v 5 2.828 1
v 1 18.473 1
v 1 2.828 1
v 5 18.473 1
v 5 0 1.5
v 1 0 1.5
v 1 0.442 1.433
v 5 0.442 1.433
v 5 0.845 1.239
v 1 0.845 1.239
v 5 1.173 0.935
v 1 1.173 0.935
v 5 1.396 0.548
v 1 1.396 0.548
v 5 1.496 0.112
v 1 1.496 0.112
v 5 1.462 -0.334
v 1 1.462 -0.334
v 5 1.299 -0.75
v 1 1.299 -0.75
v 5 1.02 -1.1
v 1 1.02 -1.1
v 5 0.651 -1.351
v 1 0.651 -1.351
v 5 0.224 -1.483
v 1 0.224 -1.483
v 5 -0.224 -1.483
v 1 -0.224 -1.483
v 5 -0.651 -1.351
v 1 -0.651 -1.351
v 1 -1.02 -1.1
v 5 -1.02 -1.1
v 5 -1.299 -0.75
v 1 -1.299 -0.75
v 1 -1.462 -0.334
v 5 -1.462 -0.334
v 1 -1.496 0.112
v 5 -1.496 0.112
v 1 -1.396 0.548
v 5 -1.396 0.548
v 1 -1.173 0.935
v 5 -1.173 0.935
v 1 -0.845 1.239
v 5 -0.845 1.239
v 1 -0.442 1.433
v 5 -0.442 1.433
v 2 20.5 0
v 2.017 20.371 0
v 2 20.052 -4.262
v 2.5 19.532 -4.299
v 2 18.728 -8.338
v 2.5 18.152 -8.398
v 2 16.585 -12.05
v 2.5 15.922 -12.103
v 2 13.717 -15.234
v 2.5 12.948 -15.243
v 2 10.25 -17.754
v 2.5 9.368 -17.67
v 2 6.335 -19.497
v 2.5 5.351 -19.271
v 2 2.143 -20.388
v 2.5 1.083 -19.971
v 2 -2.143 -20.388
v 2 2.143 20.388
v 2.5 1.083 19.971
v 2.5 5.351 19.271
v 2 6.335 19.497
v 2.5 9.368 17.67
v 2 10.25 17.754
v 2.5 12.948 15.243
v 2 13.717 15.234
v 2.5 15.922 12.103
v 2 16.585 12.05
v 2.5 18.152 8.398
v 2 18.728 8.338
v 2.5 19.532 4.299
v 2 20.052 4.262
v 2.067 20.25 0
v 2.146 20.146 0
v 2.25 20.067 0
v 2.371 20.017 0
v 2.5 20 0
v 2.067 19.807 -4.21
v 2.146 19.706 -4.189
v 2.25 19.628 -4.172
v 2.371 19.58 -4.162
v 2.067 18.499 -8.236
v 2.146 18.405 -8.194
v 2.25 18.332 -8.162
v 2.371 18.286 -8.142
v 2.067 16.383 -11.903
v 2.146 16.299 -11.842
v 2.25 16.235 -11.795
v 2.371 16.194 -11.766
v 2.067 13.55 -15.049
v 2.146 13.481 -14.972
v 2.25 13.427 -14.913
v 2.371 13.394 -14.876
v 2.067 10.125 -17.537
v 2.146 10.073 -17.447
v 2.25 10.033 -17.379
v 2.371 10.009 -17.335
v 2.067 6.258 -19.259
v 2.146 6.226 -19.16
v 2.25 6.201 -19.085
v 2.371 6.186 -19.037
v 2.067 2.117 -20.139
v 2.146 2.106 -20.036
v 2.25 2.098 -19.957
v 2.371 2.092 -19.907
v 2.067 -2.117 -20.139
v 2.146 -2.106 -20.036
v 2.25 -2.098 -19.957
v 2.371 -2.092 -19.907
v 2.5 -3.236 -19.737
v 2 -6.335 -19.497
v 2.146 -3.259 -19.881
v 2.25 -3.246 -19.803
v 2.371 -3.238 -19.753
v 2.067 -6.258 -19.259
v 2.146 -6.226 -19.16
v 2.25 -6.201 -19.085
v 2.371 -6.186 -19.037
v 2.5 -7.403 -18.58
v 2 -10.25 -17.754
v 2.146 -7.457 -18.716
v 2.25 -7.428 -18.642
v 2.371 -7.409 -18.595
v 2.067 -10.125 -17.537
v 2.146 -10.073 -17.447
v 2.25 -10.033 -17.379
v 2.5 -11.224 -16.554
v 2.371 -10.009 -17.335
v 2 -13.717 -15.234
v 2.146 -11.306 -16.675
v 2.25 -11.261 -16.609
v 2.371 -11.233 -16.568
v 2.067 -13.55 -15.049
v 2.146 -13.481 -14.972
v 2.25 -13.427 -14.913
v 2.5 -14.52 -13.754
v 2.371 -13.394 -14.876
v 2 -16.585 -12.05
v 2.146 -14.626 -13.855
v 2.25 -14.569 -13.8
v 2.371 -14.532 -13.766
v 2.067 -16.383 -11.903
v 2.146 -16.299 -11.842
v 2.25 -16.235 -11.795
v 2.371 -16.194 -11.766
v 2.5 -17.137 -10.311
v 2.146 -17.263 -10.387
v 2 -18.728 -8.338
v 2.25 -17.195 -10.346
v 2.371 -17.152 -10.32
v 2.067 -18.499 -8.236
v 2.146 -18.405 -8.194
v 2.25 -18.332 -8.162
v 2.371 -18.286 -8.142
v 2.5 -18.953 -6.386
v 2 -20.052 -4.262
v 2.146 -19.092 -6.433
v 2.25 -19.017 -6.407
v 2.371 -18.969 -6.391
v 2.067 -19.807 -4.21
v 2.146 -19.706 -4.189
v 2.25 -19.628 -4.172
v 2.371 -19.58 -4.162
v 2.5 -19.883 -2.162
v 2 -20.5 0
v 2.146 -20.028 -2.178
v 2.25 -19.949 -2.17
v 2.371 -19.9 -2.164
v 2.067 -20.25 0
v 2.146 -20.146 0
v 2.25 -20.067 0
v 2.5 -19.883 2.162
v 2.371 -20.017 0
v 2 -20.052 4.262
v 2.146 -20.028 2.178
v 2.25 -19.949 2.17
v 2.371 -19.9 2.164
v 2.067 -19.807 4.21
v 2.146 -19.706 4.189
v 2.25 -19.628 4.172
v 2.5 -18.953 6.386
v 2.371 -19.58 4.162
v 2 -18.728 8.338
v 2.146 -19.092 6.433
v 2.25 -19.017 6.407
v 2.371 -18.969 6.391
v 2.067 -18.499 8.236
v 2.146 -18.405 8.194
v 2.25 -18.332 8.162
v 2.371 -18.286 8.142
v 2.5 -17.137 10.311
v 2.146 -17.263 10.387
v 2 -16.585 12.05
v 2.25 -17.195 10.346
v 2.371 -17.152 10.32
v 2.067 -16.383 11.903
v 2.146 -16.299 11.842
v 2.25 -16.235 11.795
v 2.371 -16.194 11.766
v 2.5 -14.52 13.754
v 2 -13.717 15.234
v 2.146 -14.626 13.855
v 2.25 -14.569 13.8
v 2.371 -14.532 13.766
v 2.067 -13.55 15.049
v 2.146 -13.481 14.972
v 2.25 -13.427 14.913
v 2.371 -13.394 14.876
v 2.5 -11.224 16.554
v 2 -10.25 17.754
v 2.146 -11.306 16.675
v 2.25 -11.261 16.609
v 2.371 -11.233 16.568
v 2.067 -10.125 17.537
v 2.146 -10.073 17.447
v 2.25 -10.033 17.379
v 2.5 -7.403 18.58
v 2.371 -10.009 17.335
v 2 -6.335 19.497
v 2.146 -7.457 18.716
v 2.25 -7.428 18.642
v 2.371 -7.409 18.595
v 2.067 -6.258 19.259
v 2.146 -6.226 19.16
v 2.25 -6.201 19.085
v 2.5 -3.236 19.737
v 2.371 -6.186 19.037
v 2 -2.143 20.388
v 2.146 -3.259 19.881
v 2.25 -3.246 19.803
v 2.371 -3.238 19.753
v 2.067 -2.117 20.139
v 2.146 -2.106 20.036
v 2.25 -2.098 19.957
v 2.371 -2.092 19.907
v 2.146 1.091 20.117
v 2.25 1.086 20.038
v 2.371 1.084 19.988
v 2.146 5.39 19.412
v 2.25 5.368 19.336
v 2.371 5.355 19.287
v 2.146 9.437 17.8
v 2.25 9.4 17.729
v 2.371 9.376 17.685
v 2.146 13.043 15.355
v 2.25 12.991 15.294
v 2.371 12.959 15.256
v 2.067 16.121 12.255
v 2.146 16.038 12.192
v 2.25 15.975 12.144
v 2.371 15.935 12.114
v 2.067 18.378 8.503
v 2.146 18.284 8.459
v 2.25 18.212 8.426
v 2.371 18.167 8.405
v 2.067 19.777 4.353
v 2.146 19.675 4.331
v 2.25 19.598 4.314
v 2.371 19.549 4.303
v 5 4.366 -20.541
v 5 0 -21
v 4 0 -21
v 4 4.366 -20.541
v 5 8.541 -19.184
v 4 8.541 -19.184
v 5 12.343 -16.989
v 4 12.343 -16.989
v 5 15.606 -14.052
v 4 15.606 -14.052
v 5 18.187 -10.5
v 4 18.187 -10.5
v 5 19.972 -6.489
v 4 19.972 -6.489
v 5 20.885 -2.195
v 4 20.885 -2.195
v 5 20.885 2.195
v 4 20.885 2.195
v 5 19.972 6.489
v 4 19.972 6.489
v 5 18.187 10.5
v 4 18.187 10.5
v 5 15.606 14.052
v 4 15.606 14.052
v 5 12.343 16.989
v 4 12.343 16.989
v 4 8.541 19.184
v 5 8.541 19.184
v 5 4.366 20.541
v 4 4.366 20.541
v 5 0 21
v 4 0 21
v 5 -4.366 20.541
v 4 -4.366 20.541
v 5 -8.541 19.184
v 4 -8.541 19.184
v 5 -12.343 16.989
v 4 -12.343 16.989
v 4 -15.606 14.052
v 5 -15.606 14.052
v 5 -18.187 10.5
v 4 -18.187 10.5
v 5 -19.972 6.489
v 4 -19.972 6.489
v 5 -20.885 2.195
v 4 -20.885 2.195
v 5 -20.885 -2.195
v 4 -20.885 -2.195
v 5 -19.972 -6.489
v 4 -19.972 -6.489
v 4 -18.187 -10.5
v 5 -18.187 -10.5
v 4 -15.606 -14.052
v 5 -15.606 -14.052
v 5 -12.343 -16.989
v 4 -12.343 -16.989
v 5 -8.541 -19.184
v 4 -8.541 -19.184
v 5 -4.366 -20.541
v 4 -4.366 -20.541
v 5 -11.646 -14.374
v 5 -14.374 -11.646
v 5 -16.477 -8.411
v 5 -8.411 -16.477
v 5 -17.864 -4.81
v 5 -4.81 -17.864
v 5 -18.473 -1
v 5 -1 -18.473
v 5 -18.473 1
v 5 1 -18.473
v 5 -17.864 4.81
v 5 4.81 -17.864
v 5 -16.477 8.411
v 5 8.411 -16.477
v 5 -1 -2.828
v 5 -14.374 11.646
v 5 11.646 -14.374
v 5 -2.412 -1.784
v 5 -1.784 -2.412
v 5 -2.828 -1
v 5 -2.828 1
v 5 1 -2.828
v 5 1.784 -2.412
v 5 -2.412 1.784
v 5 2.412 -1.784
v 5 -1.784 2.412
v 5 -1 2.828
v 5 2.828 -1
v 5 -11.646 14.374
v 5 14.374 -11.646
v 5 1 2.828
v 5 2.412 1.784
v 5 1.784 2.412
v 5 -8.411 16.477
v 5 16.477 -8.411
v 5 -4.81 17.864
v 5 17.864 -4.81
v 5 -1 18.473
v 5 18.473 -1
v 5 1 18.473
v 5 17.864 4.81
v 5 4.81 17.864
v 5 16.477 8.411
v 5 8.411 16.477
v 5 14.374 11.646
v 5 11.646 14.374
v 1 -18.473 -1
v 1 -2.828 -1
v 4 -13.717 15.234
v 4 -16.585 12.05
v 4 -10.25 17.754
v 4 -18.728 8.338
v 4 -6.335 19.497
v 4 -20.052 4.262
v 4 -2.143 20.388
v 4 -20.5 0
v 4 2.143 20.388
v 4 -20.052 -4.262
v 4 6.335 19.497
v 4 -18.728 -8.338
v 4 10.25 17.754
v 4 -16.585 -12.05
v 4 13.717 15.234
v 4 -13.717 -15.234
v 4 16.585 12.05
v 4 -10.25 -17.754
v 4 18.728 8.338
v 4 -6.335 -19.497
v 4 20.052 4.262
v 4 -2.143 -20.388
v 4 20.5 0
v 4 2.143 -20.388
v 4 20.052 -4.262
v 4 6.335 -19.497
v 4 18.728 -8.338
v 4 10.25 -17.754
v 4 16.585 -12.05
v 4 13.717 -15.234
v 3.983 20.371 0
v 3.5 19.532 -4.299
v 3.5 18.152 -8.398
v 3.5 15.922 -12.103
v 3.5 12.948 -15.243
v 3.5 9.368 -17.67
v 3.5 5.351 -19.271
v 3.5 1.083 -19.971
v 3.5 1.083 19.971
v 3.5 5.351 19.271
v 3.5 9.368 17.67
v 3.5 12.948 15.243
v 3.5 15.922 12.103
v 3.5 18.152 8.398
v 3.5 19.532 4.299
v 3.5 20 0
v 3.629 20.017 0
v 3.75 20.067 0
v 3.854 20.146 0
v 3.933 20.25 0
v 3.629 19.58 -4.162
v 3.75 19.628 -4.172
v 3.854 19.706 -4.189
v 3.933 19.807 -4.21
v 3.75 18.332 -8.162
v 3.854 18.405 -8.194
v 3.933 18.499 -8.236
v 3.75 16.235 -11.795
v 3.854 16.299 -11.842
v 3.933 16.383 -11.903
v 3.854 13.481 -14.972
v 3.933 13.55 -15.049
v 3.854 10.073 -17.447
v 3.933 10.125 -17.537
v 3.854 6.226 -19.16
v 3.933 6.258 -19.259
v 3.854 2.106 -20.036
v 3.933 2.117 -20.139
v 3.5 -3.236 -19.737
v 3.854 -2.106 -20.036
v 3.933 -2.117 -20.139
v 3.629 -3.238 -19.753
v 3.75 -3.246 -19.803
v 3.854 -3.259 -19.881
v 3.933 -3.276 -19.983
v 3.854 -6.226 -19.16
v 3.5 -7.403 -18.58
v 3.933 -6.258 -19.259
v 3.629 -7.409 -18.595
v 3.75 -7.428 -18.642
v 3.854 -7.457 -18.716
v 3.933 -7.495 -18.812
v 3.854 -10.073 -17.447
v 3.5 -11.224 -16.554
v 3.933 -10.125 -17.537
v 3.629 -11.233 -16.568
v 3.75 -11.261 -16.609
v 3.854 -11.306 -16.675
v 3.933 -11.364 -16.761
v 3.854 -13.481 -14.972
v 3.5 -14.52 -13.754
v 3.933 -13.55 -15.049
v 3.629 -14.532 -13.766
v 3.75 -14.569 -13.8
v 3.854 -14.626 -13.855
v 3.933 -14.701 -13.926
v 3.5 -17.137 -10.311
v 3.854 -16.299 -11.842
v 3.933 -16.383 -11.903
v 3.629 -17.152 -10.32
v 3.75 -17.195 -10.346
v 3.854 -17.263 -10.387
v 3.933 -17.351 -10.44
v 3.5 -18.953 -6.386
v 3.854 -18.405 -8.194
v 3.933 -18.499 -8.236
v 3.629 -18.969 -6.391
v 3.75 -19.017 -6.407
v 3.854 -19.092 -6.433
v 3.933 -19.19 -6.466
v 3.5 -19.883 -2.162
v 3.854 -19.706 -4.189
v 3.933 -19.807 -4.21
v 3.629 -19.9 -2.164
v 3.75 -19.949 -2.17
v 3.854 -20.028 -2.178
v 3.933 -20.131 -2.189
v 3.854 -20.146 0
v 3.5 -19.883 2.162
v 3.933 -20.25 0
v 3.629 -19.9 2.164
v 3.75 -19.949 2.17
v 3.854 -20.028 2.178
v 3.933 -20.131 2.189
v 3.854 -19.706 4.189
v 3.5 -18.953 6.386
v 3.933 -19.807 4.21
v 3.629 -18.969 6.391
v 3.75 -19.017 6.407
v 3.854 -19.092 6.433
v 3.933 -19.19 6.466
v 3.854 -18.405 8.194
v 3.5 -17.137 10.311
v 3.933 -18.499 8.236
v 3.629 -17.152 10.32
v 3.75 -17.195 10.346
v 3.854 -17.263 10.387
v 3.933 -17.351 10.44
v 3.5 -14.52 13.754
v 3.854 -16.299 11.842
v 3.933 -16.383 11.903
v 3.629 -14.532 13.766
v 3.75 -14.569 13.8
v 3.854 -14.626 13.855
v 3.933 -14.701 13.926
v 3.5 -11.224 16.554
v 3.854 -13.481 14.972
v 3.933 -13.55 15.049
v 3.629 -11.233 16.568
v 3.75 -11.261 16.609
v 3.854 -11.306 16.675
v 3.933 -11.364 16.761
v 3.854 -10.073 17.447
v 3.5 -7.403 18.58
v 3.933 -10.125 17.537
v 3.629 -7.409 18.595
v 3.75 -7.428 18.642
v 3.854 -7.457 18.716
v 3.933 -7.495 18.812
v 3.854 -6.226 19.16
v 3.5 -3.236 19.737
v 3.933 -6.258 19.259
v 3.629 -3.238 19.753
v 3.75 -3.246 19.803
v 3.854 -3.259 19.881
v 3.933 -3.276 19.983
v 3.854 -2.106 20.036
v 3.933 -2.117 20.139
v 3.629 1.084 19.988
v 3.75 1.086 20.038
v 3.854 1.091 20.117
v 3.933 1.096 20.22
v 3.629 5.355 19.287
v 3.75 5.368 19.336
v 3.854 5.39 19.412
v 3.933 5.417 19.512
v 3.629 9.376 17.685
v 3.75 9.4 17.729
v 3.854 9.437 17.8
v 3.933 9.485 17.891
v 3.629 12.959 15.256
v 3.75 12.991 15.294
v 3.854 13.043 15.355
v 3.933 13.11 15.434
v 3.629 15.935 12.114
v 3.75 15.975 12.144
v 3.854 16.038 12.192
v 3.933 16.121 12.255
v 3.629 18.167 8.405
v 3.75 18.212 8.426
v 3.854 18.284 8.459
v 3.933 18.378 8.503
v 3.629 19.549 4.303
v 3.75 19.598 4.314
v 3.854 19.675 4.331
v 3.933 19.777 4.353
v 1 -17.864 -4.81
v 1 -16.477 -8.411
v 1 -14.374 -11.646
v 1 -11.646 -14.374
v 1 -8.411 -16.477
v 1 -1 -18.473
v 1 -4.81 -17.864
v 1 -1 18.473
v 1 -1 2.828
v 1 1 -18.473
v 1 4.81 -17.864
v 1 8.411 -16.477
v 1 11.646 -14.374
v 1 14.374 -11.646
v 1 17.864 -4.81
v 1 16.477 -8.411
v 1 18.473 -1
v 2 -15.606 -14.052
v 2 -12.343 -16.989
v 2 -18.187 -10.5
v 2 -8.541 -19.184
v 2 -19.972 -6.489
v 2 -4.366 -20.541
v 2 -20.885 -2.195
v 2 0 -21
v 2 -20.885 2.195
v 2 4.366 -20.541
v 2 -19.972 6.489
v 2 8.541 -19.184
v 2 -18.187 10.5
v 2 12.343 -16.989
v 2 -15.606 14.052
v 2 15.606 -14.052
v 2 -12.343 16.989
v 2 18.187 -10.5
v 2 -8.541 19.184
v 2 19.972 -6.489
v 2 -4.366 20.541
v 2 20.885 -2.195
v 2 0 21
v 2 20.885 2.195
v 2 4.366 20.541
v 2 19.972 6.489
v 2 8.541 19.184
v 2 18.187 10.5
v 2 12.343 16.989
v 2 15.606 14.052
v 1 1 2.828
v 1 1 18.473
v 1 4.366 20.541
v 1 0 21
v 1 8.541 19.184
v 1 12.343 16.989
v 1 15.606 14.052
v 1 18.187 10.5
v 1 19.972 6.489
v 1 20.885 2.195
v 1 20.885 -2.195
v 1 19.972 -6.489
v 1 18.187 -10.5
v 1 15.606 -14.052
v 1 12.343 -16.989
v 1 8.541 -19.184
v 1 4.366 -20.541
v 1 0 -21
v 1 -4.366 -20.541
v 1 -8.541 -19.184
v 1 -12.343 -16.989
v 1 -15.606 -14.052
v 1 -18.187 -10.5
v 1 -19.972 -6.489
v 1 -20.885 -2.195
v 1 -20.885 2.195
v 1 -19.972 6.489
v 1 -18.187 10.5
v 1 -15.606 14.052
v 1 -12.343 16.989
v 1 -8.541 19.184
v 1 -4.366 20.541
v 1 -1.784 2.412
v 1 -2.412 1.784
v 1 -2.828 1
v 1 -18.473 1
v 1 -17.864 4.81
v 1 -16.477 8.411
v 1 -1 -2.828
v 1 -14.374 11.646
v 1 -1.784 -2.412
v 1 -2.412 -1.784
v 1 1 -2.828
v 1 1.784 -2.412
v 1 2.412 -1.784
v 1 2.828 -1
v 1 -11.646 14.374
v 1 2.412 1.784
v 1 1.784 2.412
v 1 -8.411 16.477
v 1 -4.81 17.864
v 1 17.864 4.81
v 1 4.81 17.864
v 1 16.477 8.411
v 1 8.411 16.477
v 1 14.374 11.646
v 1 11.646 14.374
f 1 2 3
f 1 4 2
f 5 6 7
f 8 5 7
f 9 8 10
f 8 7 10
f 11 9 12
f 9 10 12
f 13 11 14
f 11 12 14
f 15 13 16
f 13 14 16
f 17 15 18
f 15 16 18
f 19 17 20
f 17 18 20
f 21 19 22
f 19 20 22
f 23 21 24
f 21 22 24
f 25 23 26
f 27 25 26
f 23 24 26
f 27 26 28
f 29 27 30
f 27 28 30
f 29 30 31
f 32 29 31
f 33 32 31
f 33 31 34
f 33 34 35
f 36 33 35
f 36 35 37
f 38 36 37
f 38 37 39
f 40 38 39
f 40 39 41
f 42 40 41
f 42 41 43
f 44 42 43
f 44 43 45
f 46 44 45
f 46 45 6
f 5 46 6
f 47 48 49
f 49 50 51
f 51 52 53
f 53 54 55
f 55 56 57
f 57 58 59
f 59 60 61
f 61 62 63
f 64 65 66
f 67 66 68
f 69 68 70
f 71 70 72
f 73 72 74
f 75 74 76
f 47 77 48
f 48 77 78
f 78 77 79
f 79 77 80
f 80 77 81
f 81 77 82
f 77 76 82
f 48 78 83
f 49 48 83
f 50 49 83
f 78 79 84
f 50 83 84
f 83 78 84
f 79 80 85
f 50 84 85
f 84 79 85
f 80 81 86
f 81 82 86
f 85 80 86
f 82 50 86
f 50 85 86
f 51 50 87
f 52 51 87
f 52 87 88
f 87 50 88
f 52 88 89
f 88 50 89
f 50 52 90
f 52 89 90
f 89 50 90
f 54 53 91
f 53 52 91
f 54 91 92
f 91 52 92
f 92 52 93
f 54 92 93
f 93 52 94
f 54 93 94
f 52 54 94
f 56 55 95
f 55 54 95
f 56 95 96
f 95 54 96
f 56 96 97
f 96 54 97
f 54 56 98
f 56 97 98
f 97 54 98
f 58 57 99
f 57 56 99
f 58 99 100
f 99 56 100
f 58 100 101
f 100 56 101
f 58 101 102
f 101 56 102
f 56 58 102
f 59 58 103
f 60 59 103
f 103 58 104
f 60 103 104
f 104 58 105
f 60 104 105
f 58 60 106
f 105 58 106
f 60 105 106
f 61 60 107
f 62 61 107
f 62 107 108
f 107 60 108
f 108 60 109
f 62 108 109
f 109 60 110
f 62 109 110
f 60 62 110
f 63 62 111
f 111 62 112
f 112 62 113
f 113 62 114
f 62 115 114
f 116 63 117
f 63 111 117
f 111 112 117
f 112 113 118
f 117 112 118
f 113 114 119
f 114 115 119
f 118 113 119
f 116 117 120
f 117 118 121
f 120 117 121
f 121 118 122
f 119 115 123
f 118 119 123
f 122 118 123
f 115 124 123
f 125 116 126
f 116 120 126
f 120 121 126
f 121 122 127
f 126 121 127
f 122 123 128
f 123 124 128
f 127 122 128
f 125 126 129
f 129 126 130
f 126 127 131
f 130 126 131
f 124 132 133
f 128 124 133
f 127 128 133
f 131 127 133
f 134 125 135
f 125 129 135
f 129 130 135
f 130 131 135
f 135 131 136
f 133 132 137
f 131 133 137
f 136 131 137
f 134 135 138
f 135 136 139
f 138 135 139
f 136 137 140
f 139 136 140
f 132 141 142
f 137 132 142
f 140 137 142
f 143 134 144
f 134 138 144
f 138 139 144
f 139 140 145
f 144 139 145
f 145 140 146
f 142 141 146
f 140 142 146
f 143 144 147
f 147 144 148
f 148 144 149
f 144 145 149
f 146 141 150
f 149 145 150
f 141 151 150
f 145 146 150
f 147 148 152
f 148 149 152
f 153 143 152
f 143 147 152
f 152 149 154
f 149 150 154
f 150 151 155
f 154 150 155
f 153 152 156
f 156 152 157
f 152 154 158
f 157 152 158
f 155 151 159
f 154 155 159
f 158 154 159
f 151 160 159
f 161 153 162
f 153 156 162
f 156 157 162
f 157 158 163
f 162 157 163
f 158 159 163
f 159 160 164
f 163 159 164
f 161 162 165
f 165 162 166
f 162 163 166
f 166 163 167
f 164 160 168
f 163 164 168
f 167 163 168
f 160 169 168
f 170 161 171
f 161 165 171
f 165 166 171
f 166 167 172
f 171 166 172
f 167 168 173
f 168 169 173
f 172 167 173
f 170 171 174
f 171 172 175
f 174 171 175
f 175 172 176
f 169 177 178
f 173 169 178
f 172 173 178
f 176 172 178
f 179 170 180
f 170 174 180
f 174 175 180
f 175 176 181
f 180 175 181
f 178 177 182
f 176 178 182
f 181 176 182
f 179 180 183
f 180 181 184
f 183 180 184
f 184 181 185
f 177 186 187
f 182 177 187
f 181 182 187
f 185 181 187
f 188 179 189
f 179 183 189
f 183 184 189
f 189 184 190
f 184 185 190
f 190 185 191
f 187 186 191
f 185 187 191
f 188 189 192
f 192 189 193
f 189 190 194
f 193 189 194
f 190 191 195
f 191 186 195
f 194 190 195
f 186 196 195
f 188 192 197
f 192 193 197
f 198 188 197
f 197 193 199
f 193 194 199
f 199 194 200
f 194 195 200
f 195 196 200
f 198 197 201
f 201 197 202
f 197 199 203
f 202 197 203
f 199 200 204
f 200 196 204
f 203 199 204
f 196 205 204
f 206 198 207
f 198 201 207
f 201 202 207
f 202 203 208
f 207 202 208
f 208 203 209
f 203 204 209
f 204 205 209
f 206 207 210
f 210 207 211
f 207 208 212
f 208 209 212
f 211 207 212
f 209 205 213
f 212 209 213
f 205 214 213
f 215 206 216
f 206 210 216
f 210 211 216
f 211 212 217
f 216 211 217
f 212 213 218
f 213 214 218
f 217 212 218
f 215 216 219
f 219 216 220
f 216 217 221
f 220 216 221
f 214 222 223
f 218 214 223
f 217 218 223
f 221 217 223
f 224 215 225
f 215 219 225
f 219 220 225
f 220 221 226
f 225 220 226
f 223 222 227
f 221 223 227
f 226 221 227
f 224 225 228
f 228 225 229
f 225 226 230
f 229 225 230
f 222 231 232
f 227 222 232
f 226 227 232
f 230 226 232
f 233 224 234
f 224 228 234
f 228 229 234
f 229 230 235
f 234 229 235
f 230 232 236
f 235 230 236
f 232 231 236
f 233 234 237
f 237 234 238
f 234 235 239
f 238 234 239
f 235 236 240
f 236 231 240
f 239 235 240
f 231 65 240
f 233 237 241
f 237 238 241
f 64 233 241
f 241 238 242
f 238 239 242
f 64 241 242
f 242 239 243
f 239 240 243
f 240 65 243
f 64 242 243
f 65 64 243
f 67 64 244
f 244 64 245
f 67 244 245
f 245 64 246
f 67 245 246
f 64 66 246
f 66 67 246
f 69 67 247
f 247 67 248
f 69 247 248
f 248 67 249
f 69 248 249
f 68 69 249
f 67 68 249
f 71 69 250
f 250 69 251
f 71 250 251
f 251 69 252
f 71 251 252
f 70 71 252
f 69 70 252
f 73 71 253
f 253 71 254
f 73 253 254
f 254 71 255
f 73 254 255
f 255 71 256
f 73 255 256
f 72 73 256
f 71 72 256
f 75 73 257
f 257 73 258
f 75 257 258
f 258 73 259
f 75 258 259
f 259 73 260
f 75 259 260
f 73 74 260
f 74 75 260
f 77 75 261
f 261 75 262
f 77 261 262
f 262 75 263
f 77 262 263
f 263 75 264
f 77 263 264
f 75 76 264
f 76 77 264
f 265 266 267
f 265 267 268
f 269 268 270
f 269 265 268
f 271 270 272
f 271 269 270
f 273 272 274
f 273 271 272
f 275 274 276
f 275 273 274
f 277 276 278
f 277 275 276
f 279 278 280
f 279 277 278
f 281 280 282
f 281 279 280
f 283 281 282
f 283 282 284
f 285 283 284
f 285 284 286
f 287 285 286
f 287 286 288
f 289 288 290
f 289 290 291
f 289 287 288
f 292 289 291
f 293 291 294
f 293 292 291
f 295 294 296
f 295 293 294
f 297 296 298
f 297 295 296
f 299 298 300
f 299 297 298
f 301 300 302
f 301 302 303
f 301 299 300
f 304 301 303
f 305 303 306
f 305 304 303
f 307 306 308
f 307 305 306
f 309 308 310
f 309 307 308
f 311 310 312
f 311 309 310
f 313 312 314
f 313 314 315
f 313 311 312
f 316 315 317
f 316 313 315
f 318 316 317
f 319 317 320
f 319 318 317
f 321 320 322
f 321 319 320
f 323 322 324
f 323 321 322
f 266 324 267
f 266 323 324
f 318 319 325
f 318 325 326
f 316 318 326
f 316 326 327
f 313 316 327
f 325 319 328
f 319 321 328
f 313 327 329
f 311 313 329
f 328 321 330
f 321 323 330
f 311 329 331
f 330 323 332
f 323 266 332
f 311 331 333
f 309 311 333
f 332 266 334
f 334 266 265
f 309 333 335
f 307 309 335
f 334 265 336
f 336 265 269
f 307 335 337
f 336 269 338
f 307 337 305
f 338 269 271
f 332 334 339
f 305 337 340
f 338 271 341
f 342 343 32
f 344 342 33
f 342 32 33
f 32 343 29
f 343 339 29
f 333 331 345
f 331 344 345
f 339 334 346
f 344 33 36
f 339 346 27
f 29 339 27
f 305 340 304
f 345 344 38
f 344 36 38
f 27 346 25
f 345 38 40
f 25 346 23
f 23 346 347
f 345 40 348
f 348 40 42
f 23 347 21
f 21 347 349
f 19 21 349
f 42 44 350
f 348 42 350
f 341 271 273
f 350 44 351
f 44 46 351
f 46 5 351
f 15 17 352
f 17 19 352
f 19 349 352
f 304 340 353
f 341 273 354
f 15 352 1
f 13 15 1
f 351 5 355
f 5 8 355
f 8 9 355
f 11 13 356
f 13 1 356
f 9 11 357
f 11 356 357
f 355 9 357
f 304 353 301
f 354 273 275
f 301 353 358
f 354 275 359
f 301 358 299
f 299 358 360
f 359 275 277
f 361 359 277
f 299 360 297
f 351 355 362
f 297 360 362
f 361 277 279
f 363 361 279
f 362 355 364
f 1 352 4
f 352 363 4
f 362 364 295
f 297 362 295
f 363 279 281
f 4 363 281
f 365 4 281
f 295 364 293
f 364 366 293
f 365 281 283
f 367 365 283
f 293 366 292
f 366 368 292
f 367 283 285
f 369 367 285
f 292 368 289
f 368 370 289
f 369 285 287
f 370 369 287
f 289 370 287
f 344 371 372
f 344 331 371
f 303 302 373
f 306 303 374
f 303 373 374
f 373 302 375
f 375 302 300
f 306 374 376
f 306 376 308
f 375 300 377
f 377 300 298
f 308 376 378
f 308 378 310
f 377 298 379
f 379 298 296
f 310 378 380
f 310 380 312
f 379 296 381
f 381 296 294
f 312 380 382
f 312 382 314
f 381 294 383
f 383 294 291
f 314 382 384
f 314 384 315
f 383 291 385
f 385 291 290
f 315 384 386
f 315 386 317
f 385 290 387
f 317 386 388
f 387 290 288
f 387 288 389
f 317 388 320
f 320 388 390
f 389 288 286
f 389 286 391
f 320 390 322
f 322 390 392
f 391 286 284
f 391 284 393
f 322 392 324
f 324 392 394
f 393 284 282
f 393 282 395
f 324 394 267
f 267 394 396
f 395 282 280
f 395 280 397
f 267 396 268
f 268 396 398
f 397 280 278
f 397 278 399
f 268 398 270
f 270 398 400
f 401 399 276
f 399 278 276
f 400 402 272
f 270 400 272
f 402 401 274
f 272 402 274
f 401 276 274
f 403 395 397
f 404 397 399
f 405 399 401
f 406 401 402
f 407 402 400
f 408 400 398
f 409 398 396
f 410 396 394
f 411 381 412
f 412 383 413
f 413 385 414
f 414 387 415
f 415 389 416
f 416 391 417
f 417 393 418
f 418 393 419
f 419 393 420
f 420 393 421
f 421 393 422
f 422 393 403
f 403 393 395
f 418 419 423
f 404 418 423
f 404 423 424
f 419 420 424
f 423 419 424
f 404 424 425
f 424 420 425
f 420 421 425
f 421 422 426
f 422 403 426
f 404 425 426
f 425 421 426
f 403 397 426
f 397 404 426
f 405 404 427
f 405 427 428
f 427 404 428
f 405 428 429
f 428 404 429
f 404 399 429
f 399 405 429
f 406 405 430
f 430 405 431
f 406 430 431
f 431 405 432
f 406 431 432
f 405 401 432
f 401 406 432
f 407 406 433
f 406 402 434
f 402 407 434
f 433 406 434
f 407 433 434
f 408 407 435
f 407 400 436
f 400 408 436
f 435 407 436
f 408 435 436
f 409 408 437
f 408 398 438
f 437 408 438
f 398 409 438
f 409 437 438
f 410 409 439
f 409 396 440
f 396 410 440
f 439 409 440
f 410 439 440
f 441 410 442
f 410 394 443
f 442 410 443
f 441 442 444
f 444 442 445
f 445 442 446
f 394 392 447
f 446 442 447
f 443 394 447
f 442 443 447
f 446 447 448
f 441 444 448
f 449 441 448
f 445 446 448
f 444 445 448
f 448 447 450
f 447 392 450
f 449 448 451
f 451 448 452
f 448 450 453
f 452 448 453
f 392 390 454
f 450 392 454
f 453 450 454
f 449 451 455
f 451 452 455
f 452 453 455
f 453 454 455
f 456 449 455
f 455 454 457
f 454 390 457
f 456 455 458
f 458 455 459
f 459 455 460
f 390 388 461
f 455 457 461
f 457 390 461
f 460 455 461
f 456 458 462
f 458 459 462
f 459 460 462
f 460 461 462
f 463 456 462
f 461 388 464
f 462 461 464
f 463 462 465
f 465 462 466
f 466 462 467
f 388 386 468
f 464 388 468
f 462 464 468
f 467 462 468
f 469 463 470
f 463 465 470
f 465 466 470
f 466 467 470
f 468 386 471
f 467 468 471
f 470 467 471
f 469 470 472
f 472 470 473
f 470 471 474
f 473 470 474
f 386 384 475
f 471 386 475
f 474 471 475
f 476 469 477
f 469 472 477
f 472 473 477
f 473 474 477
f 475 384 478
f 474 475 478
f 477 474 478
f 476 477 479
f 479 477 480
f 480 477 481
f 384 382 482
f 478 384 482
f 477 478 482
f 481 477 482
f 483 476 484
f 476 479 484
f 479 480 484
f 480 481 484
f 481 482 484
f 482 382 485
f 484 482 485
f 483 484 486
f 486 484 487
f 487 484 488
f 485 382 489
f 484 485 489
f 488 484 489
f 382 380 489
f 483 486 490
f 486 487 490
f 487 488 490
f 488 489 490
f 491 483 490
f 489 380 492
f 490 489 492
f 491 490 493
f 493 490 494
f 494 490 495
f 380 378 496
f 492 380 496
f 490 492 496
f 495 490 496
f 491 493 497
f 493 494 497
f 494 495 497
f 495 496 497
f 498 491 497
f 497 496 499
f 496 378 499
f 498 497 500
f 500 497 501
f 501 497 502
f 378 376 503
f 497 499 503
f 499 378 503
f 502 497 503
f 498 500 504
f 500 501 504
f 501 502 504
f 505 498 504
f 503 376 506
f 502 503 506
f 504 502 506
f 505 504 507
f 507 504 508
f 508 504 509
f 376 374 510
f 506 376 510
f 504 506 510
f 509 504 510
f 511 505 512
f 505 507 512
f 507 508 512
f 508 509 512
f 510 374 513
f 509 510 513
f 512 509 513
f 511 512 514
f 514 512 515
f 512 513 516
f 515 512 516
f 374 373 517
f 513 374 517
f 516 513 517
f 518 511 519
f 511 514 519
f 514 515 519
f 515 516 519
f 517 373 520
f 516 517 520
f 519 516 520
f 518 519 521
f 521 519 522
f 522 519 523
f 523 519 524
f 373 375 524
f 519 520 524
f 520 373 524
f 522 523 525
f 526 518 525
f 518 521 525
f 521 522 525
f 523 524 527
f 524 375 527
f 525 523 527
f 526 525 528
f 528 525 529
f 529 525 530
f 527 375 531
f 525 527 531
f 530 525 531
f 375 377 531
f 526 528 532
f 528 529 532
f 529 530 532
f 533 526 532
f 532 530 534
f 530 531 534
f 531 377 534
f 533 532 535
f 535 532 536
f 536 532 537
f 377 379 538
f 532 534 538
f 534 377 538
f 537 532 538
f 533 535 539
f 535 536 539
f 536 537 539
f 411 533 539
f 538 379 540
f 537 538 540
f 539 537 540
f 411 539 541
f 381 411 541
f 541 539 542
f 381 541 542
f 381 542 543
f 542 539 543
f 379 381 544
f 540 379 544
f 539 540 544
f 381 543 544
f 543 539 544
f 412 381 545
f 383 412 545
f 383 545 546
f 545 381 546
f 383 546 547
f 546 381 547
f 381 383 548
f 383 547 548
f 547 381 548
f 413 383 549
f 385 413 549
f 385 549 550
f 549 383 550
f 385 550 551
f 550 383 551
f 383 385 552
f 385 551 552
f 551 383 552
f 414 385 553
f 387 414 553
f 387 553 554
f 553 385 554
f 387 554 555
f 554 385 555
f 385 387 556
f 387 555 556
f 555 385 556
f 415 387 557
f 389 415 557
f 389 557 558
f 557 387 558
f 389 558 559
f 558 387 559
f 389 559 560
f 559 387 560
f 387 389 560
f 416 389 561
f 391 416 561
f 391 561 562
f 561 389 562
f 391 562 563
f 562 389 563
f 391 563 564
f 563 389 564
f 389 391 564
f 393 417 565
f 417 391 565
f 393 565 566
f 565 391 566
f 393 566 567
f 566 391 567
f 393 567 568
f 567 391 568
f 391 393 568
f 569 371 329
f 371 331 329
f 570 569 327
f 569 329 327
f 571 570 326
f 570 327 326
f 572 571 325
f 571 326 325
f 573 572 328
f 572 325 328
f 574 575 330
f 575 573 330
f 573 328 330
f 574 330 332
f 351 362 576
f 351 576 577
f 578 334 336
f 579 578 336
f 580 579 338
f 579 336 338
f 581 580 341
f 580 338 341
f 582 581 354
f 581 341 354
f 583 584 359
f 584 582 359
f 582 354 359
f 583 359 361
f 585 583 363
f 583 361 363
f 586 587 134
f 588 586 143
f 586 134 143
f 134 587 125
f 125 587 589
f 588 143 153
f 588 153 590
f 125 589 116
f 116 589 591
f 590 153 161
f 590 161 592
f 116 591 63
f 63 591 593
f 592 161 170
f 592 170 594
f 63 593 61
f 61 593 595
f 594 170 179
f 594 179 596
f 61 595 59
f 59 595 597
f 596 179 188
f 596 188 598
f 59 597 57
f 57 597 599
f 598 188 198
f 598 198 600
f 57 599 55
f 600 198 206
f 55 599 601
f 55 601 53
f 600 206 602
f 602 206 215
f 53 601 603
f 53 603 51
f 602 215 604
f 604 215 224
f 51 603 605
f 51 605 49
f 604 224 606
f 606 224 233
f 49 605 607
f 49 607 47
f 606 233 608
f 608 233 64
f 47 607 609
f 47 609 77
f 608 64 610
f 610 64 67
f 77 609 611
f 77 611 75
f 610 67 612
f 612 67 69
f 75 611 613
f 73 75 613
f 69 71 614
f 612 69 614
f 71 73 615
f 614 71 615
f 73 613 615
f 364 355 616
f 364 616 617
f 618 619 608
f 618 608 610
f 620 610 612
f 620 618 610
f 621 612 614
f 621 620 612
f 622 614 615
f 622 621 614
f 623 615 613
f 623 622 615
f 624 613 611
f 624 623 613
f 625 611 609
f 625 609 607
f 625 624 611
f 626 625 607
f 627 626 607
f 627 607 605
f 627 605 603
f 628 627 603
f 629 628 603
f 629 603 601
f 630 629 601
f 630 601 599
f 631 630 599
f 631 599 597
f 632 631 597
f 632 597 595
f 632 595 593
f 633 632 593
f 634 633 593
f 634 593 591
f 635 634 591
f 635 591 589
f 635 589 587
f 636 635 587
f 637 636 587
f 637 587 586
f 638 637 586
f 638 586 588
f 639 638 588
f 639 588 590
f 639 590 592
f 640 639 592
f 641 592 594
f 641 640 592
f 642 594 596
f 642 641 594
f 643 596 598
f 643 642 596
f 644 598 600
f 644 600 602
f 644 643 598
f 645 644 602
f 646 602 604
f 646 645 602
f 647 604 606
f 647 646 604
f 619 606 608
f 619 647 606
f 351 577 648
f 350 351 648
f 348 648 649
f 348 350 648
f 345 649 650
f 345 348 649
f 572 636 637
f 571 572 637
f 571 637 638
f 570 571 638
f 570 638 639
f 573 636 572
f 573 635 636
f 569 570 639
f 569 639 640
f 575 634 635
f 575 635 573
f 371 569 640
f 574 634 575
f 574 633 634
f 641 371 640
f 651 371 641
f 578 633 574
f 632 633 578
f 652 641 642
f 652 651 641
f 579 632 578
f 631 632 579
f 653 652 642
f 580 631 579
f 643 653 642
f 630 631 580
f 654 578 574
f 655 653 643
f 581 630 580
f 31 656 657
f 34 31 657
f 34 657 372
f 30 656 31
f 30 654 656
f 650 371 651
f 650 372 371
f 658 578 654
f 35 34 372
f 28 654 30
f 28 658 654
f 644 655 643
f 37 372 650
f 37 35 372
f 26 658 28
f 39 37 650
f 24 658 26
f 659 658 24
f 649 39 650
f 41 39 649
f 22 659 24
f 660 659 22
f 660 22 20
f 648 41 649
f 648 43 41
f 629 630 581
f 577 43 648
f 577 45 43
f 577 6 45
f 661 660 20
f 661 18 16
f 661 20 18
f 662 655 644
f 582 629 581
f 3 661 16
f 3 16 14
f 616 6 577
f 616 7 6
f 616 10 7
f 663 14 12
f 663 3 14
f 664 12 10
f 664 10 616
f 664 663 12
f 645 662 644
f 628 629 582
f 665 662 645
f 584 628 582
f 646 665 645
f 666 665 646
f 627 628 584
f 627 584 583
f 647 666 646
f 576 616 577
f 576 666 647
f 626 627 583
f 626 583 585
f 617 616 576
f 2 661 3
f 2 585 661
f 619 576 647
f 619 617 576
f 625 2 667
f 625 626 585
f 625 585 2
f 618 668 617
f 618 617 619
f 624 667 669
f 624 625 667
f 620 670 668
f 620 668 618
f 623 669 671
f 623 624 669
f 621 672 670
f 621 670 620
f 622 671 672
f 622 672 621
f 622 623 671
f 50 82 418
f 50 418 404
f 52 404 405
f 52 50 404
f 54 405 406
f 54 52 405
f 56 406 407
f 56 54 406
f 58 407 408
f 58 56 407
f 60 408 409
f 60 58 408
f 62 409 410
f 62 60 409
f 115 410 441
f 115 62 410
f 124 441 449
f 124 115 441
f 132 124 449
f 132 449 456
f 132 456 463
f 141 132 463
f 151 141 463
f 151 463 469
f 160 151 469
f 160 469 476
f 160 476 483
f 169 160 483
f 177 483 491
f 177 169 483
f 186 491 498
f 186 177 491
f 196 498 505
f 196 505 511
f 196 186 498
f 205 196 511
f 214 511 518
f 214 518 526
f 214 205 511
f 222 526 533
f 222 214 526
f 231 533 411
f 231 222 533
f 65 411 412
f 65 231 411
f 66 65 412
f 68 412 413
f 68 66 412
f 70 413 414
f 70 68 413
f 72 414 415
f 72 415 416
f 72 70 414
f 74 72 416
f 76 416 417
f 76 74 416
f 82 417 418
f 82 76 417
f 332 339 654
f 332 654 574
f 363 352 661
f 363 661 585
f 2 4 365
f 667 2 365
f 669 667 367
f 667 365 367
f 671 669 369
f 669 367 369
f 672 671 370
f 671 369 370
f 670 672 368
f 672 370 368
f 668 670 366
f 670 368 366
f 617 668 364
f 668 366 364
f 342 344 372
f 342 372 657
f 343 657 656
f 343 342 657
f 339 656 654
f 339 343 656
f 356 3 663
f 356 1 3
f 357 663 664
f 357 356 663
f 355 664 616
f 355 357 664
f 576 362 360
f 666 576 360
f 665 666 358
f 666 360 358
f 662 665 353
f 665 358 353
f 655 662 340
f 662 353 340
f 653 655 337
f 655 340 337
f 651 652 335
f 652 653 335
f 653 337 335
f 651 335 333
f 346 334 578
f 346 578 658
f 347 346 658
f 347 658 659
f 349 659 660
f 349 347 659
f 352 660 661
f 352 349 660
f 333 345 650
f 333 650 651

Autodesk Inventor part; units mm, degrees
ref_plane "YZ Plane" through (0, 0, 0) normal (1, 0, 0) x (0, 1, 0)
ref_plane "XZ Plane" through (0, 0, 0) normal (0, 1, 0) x (-1, 0, 0)
ref_plane "XY Plane" through (0, 0, 0) normal (0, 0, 1) x (1, 0, 0)
sketch "Sketch1" plane through (0, 0, 0) normal (1, 0, 0) x (0, 1, 0)
  circle A0 centre (0, 0) radius 20
  dimension "d0" = 40
extrude "Extrusion1" add sketch "Sketch1" along normal blind 5
sketch "Sketch2" plane through (5, 0, 0) normal (1, 0, 0) x (0, 0, -1)
  circle A0 centre (0, 0) radius 21
  dimension "d3" = 42
extrude "Extrusion2" add sketch "Sketch2" along normal mid plane 2
sketch "Sketch3" plane through (0, 0, 0) normal (-1, 0, 0) x (0, 0, 1)
  circle A0 centre (0, 0) radius 21
extrude "Extrusion3" add sketch "Sketch3" against normal blind 2
fillet "Fillet1" radius 0.5 2 edges at (2, -20, 0) (4, -20, 0)
sketch "Sketch4" plane through (6, 0, 0) normal (1, 0, 0) x (0, 0, -1)
  circle A0 centre (0, 0) radius 18.5
  dimension "d9" = 37
extrude "Extrusion4" cut sketch "Sketch4" against normal blind 6
sketch "Sketch5" plane through (6, 0, 0) normal (1, 0, 0) x (0, 0, -1)
  circle A0 centre (0, 0) radius 2
  circle A1 centre (0, 0) radius 3
  dimension "d12" = 4
  dimension "d13" = 6
extrude "Extrusion5" add sketch "Sketch5" against normal blind 6
sketch "Sketch6" plane through (6, 0, 0) normal (1, 0, 0) x (0, 0, -1)
  point P0 (0, 0)
sketch "Sketch7" plane through (6, 0, 0) normal (1, 0, 0) x (0, 0, -1)
  circle A0 centre (0, 0) radius 3 projected
  circle A1 centre (0, 0) radius 24.6795
sketch "Sketch8" plane through (0, 0, 0) normal (-1, 0, 0) x (0, 0, 1)
  circle A0 centre (0, 0) radius 27.0731
extrude "Extrusion6" cut sketch "Sketch8" against normal blind 1
extrude "Extrusion7" cut sketch "Sketch7" against normal blind 1
sketch "Sketch9" plane through (6, 0, 0) normal (1, 0, 0) x (0, 0, -1)
  circle A0 centre (0, 0) radius 11.2863
extrude "Extrusion8" cut sketch "Sketch9" against normal blind 1
sketch "Sketch10" plane through (5, 0, 0) normal (1, 0, 0) x (0, 0, -1)
  line L0 (-2.72, 0) -> (-2.72, 1) construction
  line L1 (-2.72, 1) -> (-2.72, -1) construction
  line L2 (-2.72, 1) -> (-19.124, 1)
  line L3 (-19.124, 1) -> (-19.124, -1)
  line L4 (-19.124, -1) -> (-2.72, -1)
  line L5 (-2.72, -1) -> (-2.72, 1)
  point P0 (0, 0)
  dimension "d22" = 1
  dimension "d23" = 2
  dimension "d24" = 2
extrude "Extrusion9" add sketch "Sketch10" against normal blind 4
pattern_circular "Circular Pattern1" count 4 over 360 about axis through (6, 0, 0) along (-1, 0, 0) of "Extrusion9"
sketch "Sketch11" plane through (1, 0, 0) normal (-1, 0, 0) x (0, 0, 1)
  circle A0 centre (0, 0) radius 2 projected
  circle A1 centre (0, 0) radius 1.5
  dimension "d30" = 3
extrude "Extrusion10" add sketch "Sketch11" against normal blind 4
properties part number "mtv_brakeWheel_1-13"
